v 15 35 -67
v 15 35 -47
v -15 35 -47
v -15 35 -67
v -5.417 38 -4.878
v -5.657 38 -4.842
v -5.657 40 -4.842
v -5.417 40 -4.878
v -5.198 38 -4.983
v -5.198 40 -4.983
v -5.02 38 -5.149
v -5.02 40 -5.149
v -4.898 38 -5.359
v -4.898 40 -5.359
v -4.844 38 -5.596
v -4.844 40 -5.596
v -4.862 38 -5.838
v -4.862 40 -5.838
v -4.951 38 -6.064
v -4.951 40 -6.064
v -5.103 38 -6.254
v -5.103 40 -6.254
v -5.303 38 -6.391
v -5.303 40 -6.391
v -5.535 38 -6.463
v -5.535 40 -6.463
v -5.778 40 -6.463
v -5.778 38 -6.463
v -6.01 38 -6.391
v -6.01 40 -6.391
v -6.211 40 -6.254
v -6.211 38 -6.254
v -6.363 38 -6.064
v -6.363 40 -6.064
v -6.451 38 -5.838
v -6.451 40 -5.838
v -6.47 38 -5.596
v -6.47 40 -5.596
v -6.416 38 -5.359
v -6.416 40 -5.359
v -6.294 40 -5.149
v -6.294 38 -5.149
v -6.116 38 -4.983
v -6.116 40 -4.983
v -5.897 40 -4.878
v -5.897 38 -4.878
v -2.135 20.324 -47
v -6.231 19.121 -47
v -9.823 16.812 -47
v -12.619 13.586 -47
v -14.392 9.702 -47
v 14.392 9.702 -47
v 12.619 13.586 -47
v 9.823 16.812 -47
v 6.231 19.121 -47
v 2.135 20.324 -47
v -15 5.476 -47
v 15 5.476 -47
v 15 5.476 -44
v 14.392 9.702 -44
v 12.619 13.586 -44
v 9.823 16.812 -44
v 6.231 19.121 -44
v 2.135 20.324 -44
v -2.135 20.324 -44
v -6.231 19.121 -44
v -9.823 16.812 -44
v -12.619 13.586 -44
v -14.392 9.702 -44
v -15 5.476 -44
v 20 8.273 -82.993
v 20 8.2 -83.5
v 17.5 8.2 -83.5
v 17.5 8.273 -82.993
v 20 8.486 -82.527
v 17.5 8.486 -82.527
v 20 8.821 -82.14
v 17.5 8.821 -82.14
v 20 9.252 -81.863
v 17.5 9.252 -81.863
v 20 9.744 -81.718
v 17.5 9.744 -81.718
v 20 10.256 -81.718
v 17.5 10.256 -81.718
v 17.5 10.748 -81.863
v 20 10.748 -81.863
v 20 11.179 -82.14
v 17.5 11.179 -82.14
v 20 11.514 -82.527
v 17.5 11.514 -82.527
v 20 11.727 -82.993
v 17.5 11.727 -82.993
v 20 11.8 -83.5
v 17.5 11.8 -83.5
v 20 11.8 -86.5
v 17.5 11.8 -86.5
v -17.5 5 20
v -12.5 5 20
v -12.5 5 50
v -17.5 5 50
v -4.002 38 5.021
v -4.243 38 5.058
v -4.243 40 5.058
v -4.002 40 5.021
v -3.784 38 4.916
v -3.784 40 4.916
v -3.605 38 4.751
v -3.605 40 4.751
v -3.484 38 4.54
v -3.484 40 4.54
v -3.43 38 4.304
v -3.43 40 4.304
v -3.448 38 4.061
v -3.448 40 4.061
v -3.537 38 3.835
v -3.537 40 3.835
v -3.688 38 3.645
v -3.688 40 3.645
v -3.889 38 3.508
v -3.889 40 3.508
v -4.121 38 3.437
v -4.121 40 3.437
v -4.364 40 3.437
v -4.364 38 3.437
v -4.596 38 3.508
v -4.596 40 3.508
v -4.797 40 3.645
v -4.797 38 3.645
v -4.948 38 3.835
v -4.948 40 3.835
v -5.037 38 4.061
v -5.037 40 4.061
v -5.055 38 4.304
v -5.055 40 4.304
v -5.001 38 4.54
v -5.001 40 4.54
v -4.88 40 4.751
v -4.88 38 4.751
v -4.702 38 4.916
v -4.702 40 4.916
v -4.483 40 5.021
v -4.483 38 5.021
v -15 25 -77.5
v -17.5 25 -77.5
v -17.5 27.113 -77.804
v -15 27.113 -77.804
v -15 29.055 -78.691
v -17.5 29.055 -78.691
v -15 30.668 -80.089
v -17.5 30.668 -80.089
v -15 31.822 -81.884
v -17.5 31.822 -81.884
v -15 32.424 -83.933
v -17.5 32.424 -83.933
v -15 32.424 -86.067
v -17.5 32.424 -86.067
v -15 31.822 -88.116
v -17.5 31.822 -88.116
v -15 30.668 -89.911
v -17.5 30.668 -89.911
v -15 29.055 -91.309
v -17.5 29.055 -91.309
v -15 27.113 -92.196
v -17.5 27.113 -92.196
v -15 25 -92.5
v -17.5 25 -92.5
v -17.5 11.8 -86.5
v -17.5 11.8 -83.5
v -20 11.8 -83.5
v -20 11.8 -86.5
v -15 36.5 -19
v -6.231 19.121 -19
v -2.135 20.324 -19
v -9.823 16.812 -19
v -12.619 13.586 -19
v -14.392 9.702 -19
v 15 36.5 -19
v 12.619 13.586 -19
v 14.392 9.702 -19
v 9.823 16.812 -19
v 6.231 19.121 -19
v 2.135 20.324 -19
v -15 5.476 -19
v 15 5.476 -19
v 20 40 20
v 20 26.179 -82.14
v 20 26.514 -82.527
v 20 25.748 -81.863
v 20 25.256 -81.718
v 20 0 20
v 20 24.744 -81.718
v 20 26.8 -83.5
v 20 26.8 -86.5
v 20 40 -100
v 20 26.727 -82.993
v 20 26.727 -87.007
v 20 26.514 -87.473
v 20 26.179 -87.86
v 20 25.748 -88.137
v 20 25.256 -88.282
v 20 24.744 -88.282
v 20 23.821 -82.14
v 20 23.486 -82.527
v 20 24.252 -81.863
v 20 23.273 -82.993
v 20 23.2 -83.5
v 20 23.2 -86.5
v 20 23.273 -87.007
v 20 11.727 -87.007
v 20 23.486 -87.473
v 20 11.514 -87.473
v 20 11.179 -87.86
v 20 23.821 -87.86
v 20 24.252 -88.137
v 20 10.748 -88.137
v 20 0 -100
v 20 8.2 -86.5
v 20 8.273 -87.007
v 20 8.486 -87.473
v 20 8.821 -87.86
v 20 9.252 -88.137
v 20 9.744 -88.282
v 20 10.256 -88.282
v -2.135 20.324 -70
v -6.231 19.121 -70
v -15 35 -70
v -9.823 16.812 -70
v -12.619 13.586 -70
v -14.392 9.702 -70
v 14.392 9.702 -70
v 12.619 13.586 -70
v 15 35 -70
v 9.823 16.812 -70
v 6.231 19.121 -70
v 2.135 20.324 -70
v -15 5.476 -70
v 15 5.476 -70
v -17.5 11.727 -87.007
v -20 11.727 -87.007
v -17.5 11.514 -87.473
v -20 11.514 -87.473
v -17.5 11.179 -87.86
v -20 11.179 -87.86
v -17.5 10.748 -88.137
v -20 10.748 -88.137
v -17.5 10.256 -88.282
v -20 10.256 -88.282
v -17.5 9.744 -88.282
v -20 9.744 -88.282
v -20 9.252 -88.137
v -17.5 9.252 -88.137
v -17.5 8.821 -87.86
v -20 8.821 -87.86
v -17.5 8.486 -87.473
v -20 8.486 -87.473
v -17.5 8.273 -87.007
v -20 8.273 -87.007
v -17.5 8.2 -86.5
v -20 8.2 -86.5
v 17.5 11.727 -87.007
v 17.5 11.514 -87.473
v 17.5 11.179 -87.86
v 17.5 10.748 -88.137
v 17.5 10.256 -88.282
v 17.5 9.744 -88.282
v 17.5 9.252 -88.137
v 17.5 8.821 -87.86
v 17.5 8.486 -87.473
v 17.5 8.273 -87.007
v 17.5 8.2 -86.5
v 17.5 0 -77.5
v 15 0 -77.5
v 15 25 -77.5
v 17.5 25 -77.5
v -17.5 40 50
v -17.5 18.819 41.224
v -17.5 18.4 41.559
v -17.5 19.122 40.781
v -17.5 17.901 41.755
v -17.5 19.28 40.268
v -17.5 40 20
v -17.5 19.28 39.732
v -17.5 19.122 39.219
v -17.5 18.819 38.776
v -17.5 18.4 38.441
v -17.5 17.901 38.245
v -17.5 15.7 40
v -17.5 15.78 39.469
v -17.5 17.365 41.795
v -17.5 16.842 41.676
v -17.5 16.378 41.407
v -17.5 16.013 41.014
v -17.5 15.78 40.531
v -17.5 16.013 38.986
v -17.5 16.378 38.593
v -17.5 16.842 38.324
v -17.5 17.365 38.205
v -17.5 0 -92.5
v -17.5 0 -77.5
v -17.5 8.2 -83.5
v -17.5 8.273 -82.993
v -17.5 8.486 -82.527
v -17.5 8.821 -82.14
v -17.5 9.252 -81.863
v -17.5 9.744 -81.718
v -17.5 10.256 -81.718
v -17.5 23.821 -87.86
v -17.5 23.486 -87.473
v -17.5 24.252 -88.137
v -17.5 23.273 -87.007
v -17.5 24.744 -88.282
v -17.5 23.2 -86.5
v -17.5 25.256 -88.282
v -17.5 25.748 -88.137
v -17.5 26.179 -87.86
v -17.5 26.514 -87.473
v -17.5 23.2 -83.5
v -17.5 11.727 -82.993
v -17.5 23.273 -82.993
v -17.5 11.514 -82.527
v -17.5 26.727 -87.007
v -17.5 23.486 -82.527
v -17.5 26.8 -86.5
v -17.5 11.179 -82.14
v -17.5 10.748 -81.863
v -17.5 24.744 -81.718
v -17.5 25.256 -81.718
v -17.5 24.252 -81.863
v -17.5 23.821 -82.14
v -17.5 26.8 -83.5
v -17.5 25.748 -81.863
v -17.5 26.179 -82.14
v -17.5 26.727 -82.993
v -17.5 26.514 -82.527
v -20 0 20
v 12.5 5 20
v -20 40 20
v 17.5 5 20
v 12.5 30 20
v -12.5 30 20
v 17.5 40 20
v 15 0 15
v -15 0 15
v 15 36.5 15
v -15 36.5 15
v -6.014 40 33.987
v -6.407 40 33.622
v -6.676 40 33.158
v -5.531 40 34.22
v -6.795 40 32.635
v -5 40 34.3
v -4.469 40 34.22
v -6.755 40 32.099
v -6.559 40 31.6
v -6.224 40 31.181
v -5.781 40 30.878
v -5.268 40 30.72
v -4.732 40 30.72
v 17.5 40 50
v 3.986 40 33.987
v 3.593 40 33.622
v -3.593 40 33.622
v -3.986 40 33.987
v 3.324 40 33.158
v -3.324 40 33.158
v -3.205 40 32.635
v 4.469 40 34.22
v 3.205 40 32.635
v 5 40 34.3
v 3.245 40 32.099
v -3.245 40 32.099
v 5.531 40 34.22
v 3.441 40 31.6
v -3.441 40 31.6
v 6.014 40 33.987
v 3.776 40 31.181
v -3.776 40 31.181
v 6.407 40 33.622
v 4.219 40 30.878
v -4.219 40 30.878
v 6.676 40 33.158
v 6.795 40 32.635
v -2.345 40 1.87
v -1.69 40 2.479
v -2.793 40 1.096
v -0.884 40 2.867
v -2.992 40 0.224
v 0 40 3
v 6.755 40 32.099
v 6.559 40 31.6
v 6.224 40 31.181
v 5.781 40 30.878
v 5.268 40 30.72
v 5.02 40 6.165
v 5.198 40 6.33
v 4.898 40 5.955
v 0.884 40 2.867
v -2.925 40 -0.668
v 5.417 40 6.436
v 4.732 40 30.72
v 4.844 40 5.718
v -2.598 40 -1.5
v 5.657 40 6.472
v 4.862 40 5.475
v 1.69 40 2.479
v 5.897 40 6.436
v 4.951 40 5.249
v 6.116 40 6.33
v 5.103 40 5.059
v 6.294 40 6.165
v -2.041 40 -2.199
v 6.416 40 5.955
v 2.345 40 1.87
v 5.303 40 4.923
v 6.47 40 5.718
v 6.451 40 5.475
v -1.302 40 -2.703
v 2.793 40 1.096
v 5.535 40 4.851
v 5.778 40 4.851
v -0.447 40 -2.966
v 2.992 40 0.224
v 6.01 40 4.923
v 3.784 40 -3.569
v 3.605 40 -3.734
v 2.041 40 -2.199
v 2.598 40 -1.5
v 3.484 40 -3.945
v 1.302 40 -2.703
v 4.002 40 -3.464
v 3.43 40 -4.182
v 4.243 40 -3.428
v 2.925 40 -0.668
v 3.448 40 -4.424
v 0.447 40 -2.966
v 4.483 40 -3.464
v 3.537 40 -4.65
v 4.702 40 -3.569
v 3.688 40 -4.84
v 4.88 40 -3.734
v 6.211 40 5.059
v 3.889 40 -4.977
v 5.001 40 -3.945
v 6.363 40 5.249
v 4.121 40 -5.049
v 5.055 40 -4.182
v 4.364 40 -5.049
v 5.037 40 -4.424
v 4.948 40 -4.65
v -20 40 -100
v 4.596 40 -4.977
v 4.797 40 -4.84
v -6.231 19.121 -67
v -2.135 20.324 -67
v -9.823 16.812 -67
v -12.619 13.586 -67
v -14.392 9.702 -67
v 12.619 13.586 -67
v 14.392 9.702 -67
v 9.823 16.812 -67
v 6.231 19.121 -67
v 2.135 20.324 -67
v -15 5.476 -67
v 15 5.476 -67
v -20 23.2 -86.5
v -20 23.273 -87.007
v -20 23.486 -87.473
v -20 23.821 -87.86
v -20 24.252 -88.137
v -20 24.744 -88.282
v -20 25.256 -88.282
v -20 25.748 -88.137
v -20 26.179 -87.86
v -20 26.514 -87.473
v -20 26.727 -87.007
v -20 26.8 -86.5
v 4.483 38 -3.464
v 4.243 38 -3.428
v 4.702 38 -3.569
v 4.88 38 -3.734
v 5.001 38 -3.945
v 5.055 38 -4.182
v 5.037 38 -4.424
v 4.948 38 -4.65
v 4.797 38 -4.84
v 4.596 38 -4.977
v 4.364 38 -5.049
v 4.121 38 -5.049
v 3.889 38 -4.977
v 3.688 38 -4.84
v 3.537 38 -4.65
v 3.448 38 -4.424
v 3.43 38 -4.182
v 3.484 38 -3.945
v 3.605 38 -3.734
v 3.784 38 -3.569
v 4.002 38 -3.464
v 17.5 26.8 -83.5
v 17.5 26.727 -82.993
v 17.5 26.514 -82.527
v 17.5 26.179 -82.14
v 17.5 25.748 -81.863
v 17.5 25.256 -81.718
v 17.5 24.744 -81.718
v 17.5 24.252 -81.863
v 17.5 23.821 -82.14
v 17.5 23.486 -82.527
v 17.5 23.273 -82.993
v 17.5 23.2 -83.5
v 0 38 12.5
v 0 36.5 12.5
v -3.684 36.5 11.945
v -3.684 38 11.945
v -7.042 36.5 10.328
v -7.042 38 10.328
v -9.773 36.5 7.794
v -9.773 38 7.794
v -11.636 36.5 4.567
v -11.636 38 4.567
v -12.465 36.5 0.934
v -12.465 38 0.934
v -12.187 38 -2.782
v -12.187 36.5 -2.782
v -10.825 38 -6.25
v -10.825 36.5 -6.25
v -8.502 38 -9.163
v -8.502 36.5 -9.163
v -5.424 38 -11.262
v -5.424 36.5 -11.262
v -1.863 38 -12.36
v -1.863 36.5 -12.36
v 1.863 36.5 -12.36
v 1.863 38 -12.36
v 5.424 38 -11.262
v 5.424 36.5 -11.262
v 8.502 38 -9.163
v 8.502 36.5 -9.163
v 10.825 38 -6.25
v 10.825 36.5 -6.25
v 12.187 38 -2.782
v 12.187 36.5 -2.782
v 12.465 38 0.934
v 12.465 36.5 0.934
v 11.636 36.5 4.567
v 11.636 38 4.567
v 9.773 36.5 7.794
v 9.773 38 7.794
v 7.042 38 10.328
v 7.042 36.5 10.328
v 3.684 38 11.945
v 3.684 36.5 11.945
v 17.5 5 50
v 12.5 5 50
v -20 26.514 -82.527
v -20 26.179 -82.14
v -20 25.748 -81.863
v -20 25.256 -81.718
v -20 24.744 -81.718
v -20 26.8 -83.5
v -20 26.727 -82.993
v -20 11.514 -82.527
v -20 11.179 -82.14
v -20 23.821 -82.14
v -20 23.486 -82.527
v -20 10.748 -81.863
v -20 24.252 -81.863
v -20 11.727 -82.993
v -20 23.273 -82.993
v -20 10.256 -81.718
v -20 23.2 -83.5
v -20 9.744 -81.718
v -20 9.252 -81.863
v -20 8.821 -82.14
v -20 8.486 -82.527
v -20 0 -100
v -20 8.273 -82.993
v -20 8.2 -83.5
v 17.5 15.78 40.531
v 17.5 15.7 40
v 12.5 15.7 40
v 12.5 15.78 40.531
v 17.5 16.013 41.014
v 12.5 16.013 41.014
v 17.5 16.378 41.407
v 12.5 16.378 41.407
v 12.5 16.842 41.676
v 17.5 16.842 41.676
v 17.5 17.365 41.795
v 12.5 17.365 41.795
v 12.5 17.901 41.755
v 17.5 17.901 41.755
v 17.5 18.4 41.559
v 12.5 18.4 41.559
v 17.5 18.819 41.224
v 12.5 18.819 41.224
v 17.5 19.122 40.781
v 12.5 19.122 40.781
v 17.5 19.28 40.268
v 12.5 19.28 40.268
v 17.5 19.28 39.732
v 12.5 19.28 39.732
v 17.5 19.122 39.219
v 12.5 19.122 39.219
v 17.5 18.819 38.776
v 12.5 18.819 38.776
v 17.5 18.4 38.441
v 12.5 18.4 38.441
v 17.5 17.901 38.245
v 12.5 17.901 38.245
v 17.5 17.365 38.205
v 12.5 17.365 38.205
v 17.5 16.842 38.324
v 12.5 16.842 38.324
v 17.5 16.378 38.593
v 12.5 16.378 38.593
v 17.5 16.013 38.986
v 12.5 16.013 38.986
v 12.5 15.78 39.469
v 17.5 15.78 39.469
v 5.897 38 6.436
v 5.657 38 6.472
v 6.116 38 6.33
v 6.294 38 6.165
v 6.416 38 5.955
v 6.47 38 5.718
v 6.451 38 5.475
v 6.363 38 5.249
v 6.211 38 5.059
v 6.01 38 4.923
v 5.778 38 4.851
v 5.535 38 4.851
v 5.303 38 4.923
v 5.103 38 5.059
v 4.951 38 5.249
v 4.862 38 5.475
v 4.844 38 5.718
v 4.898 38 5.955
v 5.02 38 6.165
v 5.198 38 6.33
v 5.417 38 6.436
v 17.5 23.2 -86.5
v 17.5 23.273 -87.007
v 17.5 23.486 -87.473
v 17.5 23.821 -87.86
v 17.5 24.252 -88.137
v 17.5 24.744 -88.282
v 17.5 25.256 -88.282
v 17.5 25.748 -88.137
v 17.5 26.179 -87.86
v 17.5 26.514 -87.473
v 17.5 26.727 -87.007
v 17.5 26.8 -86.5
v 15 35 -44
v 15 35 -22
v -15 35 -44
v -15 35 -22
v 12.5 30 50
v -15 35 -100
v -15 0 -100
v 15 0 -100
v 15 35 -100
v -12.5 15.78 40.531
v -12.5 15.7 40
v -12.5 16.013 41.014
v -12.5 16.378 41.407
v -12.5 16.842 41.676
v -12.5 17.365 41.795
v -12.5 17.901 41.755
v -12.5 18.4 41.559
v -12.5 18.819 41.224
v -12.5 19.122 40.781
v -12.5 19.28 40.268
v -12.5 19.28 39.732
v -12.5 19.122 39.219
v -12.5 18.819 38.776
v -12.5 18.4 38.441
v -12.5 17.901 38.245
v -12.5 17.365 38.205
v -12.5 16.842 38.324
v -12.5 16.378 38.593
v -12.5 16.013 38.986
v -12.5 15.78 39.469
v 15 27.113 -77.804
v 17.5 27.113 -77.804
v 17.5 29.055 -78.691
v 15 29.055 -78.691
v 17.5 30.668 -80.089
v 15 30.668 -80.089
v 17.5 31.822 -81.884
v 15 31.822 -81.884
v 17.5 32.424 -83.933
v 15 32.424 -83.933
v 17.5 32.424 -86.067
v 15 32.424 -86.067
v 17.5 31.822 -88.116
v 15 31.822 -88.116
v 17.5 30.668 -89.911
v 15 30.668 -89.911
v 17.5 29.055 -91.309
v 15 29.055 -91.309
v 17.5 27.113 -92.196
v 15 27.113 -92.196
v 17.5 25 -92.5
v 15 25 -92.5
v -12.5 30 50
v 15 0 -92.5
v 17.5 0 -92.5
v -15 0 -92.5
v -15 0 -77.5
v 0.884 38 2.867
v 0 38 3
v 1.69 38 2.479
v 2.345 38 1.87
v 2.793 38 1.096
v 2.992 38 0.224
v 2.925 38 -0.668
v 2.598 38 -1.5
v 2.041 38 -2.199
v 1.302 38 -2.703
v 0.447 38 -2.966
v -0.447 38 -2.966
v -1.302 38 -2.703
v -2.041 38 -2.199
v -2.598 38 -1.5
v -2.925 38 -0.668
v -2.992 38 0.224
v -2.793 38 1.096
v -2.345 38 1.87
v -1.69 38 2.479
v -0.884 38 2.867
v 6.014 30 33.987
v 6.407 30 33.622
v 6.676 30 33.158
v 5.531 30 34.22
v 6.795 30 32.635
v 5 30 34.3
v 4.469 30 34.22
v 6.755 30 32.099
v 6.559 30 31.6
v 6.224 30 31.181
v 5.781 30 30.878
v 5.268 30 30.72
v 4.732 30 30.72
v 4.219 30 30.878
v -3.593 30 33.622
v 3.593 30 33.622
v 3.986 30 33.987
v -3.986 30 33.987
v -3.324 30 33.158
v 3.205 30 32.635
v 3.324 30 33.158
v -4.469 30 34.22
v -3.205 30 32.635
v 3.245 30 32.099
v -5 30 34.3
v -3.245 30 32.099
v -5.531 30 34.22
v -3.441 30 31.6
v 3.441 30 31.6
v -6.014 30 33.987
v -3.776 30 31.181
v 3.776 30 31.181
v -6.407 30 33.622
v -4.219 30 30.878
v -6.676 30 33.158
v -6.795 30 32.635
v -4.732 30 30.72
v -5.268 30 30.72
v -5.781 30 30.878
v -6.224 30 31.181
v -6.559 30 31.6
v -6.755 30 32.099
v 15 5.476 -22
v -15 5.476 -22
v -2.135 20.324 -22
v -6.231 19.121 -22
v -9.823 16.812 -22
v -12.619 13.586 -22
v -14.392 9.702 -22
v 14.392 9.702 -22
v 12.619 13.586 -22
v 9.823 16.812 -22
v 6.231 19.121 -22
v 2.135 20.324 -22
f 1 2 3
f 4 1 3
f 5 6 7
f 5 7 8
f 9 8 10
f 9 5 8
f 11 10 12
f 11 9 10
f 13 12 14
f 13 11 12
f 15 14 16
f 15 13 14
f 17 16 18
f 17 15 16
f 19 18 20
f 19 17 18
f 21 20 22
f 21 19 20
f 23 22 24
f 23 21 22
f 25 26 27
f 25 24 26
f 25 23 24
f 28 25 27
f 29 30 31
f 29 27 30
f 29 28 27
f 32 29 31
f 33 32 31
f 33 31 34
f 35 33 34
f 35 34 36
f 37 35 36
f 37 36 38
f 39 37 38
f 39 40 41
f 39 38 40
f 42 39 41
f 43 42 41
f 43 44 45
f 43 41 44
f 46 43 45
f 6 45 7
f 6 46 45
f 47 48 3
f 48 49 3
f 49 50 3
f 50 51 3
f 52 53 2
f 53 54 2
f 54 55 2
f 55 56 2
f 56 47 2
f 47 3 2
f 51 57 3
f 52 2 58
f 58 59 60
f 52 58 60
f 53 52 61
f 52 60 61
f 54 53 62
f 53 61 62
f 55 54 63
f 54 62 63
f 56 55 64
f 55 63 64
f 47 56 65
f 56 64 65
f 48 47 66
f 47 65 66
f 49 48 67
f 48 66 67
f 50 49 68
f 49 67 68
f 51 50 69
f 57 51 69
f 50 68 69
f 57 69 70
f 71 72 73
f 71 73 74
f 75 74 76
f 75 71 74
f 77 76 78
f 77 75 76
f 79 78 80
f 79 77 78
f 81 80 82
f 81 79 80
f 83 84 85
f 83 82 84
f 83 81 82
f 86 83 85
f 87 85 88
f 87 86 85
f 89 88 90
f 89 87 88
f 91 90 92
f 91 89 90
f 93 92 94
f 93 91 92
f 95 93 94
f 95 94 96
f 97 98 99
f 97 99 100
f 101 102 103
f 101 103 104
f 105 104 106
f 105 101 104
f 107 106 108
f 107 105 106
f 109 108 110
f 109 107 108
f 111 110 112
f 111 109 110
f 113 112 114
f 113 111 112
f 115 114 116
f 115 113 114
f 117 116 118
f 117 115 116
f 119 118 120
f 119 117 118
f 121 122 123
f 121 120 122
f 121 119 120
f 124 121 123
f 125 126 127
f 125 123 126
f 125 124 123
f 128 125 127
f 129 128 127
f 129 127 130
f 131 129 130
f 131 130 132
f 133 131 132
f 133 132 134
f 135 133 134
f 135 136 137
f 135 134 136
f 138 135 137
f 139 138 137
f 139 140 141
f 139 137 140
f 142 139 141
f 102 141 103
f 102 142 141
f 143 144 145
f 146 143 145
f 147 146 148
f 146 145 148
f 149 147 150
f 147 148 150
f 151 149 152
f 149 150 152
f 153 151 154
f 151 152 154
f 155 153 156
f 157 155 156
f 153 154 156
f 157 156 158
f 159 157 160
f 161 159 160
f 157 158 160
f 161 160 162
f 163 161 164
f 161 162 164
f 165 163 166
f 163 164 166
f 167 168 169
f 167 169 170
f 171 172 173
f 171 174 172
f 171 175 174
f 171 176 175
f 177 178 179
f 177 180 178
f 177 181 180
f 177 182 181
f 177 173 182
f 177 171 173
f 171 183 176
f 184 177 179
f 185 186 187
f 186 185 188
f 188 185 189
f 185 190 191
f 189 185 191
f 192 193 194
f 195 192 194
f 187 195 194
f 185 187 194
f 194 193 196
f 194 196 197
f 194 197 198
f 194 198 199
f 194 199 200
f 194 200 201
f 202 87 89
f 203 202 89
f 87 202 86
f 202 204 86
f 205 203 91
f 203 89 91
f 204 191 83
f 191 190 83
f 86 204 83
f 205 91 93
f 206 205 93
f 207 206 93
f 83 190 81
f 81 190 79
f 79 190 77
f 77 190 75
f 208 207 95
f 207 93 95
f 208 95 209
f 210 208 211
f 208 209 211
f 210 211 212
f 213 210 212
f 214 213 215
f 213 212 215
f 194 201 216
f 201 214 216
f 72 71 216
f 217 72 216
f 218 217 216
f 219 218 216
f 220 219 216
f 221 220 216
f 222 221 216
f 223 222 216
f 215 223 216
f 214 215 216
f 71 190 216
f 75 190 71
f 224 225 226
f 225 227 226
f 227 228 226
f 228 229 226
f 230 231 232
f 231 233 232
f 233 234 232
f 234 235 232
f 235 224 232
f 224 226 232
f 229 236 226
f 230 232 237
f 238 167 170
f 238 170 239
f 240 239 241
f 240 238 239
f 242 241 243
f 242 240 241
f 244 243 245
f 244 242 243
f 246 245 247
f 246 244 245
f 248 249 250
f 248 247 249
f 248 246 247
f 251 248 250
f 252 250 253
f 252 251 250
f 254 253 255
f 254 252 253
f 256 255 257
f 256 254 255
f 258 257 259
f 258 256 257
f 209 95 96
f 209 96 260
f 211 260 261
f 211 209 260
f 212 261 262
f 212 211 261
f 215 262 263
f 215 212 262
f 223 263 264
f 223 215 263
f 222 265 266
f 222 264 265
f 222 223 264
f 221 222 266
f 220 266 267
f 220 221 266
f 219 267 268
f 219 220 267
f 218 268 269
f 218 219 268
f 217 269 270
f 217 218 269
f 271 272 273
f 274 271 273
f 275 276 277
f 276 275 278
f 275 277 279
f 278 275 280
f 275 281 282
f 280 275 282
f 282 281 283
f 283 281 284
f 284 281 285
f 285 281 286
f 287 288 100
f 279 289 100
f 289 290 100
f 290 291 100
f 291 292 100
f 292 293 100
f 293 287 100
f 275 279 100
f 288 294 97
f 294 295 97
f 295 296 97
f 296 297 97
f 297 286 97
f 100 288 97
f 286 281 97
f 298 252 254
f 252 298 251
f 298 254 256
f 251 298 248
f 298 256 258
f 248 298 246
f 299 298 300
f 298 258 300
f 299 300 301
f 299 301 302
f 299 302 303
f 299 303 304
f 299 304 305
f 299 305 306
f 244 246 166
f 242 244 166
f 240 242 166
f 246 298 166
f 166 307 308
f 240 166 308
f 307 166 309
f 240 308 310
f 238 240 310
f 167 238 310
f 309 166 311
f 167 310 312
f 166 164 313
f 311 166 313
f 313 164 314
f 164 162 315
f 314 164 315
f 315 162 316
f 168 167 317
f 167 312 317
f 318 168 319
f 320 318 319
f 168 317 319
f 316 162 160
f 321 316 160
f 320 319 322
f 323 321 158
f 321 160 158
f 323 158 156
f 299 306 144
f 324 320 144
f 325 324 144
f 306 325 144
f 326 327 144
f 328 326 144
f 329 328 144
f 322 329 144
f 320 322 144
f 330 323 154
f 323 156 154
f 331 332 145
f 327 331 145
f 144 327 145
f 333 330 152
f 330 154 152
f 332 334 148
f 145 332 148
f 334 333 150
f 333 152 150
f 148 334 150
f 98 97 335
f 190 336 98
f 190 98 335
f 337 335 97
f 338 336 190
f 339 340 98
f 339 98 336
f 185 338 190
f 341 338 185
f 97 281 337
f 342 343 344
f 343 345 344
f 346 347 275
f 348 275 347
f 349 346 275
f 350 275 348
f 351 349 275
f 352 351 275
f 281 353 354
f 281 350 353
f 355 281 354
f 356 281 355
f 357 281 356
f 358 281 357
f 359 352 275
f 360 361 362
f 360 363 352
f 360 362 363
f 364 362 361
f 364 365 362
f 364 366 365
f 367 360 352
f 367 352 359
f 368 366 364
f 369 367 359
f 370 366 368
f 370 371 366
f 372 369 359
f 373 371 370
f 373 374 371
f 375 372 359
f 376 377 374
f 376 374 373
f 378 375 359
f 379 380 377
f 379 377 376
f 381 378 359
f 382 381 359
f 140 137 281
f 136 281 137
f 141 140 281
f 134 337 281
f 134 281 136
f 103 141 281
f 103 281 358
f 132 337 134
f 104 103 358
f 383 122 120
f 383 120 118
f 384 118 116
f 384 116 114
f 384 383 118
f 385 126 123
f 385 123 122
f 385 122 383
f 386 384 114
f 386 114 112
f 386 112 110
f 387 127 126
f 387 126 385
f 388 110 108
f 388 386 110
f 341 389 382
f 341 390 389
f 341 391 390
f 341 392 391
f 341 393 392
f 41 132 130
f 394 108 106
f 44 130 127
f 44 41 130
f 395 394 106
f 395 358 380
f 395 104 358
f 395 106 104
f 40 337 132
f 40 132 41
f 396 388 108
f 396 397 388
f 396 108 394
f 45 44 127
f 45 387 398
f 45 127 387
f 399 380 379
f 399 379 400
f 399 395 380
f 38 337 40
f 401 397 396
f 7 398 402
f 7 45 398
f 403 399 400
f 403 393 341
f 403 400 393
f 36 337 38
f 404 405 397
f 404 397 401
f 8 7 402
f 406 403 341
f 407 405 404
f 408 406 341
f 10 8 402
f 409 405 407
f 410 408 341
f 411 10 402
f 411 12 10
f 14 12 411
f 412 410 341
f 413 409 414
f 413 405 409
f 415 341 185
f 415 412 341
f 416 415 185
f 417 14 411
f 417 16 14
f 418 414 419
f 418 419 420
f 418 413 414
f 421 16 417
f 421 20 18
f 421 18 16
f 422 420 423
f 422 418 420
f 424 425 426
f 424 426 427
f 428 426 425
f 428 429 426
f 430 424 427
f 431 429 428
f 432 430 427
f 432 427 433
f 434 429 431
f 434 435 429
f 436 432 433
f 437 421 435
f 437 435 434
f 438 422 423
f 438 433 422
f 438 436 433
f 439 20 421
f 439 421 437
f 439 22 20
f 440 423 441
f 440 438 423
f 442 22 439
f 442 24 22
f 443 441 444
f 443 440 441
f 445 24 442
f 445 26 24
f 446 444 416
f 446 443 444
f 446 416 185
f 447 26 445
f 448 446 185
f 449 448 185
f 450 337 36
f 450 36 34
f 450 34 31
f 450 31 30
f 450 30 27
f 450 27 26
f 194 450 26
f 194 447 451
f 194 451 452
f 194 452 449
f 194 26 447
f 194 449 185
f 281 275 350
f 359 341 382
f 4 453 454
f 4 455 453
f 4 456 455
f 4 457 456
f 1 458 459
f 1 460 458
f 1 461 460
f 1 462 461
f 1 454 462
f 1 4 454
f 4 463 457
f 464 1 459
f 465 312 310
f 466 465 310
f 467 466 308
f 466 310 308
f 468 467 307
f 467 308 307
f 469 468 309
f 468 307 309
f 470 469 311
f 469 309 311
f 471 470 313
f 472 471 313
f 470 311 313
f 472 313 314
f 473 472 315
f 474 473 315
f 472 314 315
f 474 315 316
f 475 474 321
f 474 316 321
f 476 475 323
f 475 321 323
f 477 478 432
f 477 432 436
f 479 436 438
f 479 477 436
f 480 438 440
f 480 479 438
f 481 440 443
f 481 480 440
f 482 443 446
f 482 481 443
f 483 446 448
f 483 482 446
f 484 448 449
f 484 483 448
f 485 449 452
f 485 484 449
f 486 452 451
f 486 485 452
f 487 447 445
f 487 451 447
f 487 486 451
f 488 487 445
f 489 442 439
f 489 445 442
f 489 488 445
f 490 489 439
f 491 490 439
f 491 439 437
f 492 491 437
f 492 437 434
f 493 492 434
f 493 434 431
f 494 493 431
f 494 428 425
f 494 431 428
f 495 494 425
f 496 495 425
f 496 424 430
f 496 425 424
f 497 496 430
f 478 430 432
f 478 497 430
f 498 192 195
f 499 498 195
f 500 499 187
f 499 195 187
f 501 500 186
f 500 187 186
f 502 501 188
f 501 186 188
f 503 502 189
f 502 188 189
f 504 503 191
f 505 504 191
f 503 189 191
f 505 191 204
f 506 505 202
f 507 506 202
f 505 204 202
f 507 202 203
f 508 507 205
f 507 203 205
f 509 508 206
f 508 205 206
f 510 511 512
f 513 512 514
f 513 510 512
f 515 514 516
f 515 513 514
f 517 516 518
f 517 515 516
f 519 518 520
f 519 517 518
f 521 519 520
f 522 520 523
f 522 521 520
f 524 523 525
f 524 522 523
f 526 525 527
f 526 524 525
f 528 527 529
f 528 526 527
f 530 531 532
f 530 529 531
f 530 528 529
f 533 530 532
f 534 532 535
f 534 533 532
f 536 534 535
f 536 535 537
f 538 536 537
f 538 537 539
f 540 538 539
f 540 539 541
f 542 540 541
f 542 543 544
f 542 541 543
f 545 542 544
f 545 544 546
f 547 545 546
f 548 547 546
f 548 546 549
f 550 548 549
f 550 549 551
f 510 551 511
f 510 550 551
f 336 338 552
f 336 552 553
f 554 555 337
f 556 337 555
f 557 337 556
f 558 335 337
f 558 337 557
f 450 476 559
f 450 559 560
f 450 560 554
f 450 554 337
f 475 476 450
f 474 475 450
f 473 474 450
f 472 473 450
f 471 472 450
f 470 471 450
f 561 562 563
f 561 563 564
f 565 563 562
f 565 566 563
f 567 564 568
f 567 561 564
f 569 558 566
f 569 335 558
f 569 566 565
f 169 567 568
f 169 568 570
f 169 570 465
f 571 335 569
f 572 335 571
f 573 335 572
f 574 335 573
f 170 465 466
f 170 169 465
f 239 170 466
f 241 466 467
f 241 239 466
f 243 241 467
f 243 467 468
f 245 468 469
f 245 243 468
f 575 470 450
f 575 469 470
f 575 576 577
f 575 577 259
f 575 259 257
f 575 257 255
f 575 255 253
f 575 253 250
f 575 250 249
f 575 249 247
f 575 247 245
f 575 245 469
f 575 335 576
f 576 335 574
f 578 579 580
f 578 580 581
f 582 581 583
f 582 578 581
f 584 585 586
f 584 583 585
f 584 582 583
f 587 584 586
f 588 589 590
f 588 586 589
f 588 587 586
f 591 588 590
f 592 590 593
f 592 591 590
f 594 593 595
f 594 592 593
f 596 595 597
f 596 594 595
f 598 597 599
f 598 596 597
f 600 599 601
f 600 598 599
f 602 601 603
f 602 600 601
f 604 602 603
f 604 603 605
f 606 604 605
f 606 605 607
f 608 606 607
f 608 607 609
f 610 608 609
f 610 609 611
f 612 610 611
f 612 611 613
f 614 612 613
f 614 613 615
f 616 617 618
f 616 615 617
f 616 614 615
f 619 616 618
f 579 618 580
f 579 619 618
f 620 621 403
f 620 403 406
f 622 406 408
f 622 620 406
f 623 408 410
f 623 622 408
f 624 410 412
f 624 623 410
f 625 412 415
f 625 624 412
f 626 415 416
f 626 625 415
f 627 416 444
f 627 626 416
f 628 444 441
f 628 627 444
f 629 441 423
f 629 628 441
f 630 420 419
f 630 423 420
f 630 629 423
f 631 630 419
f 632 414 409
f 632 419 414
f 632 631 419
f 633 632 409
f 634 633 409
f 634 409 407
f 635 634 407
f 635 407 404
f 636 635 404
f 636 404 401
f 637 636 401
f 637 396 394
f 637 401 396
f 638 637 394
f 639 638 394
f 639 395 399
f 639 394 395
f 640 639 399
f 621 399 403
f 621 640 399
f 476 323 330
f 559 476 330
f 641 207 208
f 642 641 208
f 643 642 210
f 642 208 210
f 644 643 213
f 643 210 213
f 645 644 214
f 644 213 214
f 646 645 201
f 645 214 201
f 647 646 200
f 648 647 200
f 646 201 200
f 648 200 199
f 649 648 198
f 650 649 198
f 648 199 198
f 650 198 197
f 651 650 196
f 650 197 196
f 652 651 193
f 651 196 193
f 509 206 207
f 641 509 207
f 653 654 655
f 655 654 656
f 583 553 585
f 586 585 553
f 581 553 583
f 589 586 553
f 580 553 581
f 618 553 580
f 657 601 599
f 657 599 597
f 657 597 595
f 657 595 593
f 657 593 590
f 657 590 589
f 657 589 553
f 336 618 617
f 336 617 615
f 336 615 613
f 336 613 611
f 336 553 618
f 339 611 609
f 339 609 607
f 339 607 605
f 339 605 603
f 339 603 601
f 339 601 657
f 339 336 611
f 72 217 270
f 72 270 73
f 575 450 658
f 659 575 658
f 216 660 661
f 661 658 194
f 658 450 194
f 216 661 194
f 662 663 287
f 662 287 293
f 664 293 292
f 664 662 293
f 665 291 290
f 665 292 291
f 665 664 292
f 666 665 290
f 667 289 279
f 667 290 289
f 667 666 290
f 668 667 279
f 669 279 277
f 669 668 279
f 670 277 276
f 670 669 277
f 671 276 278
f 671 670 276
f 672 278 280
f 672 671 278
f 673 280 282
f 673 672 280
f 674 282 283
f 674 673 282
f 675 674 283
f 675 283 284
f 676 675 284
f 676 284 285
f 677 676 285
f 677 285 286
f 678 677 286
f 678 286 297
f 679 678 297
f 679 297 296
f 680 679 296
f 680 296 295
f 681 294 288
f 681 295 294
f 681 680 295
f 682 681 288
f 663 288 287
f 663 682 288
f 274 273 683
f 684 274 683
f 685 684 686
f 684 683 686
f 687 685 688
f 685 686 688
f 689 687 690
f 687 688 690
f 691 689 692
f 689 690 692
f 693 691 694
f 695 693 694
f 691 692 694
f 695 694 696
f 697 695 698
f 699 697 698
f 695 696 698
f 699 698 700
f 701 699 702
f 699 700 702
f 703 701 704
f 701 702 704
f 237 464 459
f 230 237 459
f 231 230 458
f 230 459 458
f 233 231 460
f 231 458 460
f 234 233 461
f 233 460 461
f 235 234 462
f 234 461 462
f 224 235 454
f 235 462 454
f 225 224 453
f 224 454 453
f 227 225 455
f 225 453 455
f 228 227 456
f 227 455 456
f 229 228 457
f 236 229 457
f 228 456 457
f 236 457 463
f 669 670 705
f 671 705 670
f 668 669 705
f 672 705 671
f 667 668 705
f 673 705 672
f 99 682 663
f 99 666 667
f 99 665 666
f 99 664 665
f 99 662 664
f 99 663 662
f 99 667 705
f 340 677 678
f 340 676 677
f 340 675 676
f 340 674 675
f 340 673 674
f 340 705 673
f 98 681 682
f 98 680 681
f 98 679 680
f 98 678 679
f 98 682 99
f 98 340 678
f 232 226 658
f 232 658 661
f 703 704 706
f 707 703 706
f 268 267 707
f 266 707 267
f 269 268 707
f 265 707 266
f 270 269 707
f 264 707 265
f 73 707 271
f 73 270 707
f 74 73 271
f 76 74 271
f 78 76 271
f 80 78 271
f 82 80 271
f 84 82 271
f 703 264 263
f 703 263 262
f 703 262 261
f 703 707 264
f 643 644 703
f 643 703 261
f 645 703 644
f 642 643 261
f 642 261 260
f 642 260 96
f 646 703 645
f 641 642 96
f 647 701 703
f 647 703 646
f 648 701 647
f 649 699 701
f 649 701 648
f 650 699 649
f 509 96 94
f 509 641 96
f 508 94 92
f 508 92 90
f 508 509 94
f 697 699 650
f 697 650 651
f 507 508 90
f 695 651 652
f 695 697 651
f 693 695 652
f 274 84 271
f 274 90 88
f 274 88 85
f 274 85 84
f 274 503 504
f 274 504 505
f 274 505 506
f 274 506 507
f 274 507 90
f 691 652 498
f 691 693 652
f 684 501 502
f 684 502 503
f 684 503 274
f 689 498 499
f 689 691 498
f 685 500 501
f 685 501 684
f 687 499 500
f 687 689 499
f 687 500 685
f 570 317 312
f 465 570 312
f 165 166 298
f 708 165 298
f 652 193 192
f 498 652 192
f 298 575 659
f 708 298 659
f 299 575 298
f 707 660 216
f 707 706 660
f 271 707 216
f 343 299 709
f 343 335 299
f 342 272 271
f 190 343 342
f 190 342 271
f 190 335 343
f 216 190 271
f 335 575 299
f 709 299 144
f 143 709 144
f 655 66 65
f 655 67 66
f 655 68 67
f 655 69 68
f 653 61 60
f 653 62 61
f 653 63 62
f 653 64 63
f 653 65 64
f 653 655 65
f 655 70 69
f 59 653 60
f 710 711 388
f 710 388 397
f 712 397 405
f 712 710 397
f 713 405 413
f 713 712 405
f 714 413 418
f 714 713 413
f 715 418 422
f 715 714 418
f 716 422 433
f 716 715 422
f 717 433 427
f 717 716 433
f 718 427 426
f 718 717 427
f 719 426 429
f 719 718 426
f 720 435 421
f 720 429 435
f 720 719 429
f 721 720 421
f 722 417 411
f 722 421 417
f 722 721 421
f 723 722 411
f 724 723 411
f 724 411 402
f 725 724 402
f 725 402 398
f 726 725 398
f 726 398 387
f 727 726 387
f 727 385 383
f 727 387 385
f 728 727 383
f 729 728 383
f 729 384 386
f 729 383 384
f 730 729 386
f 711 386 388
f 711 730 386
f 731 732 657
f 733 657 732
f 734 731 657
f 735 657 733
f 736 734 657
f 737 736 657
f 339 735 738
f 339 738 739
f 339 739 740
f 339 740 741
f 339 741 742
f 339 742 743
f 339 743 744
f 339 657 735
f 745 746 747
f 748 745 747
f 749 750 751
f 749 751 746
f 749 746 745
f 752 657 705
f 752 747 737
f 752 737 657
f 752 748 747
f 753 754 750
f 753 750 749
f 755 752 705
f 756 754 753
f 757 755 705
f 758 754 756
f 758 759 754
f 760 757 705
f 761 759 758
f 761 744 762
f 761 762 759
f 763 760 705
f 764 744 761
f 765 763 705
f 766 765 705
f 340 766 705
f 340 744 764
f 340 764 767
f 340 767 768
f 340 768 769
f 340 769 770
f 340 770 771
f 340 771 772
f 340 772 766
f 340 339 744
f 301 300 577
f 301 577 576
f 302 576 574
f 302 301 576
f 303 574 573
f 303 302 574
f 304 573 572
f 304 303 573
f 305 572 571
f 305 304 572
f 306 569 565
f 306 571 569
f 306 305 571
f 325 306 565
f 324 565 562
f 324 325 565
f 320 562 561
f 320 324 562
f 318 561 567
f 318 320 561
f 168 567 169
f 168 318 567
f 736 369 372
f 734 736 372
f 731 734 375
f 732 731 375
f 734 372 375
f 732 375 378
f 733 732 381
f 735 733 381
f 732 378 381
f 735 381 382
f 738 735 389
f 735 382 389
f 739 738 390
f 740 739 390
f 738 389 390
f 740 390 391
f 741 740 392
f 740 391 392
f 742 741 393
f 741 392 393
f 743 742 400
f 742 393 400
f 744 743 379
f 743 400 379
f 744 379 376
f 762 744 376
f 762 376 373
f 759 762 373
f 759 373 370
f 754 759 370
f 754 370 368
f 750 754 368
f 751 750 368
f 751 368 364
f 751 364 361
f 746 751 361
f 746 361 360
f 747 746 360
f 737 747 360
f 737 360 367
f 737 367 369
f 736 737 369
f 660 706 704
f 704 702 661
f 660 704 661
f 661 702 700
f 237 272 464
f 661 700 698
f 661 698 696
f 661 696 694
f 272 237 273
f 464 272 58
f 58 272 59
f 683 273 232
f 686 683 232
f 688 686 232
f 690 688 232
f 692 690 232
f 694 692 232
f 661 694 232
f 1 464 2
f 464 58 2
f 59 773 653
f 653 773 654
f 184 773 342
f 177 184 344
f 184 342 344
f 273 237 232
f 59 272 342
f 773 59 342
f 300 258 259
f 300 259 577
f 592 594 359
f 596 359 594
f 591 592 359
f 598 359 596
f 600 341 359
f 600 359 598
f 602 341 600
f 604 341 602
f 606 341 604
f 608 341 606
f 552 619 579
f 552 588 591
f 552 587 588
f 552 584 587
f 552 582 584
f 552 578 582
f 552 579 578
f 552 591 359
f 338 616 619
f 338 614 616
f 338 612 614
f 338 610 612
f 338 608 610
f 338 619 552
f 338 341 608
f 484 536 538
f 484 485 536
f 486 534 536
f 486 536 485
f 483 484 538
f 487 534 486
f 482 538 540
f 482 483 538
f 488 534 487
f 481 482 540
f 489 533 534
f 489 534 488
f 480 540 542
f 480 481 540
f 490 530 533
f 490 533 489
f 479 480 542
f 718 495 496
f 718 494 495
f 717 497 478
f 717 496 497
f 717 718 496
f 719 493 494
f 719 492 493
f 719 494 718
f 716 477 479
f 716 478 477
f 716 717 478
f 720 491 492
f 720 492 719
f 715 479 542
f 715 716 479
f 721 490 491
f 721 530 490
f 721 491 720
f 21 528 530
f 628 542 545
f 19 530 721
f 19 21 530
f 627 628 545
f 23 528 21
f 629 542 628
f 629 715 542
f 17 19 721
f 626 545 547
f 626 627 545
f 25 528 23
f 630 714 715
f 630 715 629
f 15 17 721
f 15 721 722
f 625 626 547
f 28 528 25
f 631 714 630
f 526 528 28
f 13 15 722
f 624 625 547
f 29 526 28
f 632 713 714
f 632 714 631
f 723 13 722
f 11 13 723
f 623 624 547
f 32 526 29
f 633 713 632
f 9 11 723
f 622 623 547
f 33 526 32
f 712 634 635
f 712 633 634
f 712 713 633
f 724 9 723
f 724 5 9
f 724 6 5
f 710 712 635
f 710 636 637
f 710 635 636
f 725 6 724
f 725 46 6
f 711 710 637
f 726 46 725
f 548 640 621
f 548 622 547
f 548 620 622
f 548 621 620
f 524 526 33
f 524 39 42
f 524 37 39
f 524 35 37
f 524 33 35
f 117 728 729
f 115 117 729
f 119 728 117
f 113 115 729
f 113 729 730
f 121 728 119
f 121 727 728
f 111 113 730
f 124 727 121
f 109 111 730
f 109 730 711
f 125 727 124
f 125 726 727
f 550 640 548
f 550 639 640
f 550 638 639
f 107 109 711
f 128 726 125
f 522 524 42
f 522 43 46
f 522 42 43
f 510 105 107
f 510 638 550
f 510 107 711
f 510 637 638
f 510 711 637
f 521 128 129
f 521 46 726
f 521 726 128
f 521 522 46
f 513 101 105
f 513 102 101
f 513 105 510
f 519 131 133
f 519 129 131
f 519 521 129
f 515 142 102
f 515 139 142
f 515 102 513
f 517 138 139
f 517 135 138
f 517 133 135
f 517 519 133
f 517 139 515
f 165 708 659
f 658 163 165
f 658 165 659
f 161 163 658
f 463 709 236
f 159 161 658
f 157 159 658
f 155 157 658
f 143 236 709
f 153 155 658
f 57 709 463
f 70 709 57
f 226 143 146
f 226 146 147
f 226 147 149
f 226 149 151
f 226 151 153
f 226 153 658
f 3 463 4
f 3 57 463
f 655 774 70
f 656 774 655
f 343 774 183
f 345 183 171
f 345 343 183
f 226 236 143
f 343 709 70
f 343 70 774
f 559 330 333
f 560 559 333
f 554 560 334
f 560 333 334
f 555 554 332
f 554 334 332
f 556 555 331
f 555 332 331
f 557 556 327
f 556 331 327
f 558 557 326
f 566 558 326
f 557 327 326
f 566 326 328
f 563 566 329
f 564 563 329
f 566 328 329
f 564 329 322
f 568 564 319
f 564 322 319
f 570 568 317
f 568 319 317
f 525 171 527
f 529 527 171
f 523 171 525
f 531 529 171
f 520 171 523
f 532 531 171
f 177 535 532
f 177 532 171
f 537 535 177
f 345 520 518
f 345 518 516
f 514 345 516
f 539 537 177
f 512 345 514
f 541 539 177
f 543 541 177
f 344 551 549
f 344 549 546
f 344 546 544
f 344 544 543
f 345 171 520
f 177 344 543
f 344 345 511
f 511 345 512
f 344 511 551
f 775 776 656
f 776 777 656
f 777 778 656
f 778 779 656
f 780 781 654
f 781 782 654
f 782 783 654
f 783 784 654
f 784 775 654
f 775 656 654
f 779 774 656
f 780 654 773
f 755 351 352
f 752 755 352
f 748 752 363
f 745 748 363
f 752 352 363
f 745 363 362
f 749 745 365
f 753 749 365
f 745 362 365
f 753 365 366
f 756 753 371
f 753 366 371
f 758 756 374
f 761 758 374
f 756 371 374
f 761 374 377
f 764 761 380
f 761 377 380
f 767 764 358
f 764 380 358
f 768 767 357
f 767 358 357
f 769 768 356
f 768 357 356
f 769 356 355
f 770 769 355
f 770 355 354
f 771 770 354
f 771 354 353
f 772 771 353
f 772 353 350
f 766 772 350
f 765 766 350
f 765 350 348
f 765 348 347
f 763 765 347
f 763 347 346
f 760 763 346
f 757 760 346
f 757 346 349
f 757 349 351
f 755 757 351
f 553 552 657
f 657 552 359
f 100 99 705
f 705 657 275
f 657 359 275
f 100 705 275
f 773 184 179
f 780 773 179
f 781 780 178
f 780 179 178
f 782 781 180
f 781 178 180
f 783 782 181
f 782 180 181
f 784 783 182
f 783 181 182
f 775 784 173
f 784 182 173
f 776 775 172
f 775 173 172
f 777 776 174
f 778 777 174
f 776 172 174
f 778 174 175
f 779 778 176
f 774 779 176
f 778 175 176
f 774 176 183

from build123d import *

# Parameters (mm, degrees)
SKETCH1_W                = 40
SKETCH1_H                = 40
SKETCH1_R                = 2.375
BOSS_EXTRUDE1_DEPTH      = 40
CUT_EXTRUDE1_DEPTH       = 61
CUT_EXTRUDE1_DEPTH_BACK  = 61
CUT_EXTRUDE2_DEPTH       = 49.989795019
CUT_EXTRUDE2_DEPTH_BACK  = 35
SKETCH6_W                = 30
SKETCH6_H                = 35
SKETCH3_R                = 3
CUT_EXTRUDE3_DEPTH       = 61
BOSS_EXTRUDE2_DEPTH      = 30
SKETCH8_R                = 1.8
CUT_EXTRUDE4_DEPTH       = 68.082039325
BOSS_EXTRUDE4_START      = -35
SKETCH10_W               = 5
SKETCH10_H               = 35
BOSS_EXTRUDE4_DEPTH      = 115
SKETCH11_R               = 2.375
CUT_EXTRUDE5_DEPTH       = 70
CUT_EXTRUDE6_DEPTH       = 115.891252931
CUT_EXTRUDE6_DEPTH_BACK  = 115.891252931
SKETCH14_W               = 30
SKETCH14_H               = 3
BOSS_EXTRUDE10_DEPTH     = 35
CUT_EXTRUDE7_DEPTH       = 108.819293264
CUT_EXTRUDE7_DEPTH_BACK  = 1.5
SKETCH16_W               = 30
SKETCH16_H               = 34
CUT_EXTRUDE8_DEPTH       = 32
CUT_EXTRUDE8_DEPTH_BACK  = 32.5
CUT_EXTRUDE9_DEPTH       = 115.04494728
CUT_EXTRUDE9_DEPTH_BACK  = 115.04494728
SKETCH19_R               = 1.8
SKETCH3_2_R              = 3
BOSS_EXTRUDE11_DEPTH     = 5
SKETCH20_W               = 30
SKETCH20_H               = 35
CUT_EXTRUDE10_DEPTH      = 10
CUT_EXTRUDE11_DEPTH      = 110.544511501
CUT_EXTRUDE11_DEPTH_BACK = 110.544511501
SKETCH22_R               = 3
SKETCH21_R               = 2.375
BOSS_EXTRUDE13_DEPTH     = 3.5
CUT_EXTRUDE12_DEPTH      = 110.544511501
CUT_EXTRUDE12_DEPTH_BACK = 110.544511501
SKETCH23_R               = 0.815
CUT_EXTRUDE13_DEPTH      = 109.315511355
CUT_EXTRUDE13_DEPTH_BACK = 1.5
SKETCH24_R               = 12.5
CUT_EXTRUDE14_DEPTH      = 17.5
CUT_EXTRUDE14_DEPTH_BACK = 17.5


with BuildPart() as part:
    # Sketch1 → Boss-Extrude1 (new body)
    with BuildSketch(Plane(origin=(0, 0, 0), x_dir=(1, 0, 0), z_dir=(0, 1, 0))):
        Rectangle(SKETCH1_W, SKETCH1_H)
        with Locations(Location((6.88, 0, 0), (0, 0, 270))):
            Circle(SKETCH1_R, mode=Mode.SUBTRACT)
        with Locations(Location((-0.009652089, -6.889652089, 0), (0, 0, 270))):
            Circle(SKETCH1_R, mode=Mode.SUBTRACT)
        with Locations(Location((-6.899304178, 0, 0), (0, 0, 270))):
            Circle(SKETCH1_R, mode=Mode.SUBTRACT)
        with Locations(Location((-0.009652089, 6.889652089, 0), (0, 0, 270))):
            Circle(SKETCH1_R, mode=Mode.SUBTRACT)
    extrude(amount=BOSS_EXTRUDE1_DEPTH)

    # Sketch4 → Cut-Extrude1 (cut, two sides: drawn at the far end of the back side and taken through both)
    with BuildSketch(Plane.ZY.offset(20).offset(-CUT_EXTRUDE1_DEPTH_BACK)):
        with BuildLine():
            Line((-20, 35), (-20, 0))
            Line((-20, 0), (15, 0))
            ThreePointArc((15, 0), (4.748737342, 24.748737342), (-20, 35))
        make_face()
    extrude(amount=CUT_EXTRUDE1_DEPTH + CUT_EXTRUDE1_DEPTH_BACK, mode=Mode.SUBTRACT)

    # Sketch6 → Cut-Extrude2 (cut, two sides: drawn at the far end of the back side and taken through both)
    with BuildSketch(Plane.XZ.offset(-CUT_EXTRUDE2_DEPTH_BACK)):
        with Locations((0, -2.5)):
            Rectangle(SKETCH6_W, SKETCH6_H)
    extrude(amount=CUT_EXTRUDE2_DEPTH + CUT_EXTRUDE2_DEPTH_BACK, mode=Mode.SUBTRACT)

    # Sketch3 → Cut-Extrude3 (cut, through all)
    with BuildSketch(Plane.XY.offset(20)):
        with Locations((0, 13)):
            Circle(SKETCH3_R)
        with Locations((-7, 20)):
            Circle(SKETCH3_R)
        with Locations((7, 20)):
            Circle(SKETCH3_R)
    extrude(amount=-CUT_EXTRUDE3_DEPTH, mode=Mode.SUBTRACT)

    # Sketch7 → Boss-Extrude2 (add)
    with BuildSketch(Plane.XY.offset(20)):
        Polygon((-17.5, 40), (17.5, 40), (17.5, 5), (12.5, 5), (12.5, 30), (-12.5, 30), (-12.5, 5), (-17.5, 5), (-17.5, 23.79079138), align=None)
    extrude(amount=BOSS_EXTRUDE2_DEPTH)

    # Sketch8 → Cut-Extrude4 (cut, through all)
    with BuildSketch(Plane(origin=(0, 40, 0), x_dir=(1, 0, 0), z_dir=(0, 1, 0))):
        with Locations(Location((5, -32.5, 0), (0, 0, 270))):
            Circle(SKETCH8_R)
        with Locations(Location((-5, -32.5, 0), (0, 0, 270))):
            Circle(SKETCH8_R)
    extrude(amount=-CUT_EXTRUDE4_DEPTH, mode=Mode.SUBTRACT)

    # Sketch10 → Boss-Extrude4 (add)
    with BuildSketch(Plane(origin=(0, 0, -20), x_dir=(-1, 0, 0), z_dir=(0, 0, -1)).offset(BOSS_EXTRUDE4_START)):
        Polygon((20, 40), (-20, 40), (-20, 35), (-15, 35), (15, 35), (20, 35), align=None)
        with Locations((17.5, 17.5)):
            Rectangle(SKETCH10_W, SKETCH10_H)
        with Locations((-17.5, 17.5)):
            Rectangle(SKETCH10_W, SKETCH10_H)
    extrude(amount=BOSS_EXTRUDE4_DEPTH)

    # Sketch11 → Cut-Extrude5 (cut)
    with BuildSketch(Plane(origin=(0, 40, 0), x_dir=(1, 0, 0), z_dir=(0, 1, 0))):
        with Locations(Location((-0.009652089, -6.889652089, 0), (0, 0, 270))):
            Circle(SKETCH11_R)
        with Locations(Location((6.88, 0, 0), (0, 0, 270))):
            Circle(SKETCH11_R)
        with Locations(Location((-0.009652089, 6.889652089, 0), (0, 0, 270))):
            Circle(SKETCH11_R)
        with Locations(Location((-6.899304178, 0, 0), (0, 0, 270))):
            Circle(SKETCH11_R)
    extrude(amount=-CUT_EXTRUDE5_DEPTH, mode=Mode.SUBTRACT)

    # Sketch13 → Cut-Extrude6 (cut, two sides: drawn at the far end of the back side and taken through both)
    with BuildSketch(Plane.ZY.offset(20).offset(-CUT_EXTRUDE6_DEPTH_BACK)):
        with BuildLine():
            Line((-86.5, 26.8), (-83.5, 26.8))
            ThreePointArc((-83.5, 26.8), (-81.7, 25), (-83.5, 23.2))
            Line((-83.5, 23.2), (-86.5, 23.2))
            ThreePointArc((-86.5, 23.2), (-88.3, 25), (-86.5, 26.8))
        make_face()
        with BuildLine():
            Line((-86.5, 8.2), (-83.5, 8.2))
            ThreePointArc((-83.5, 8.2), (-81.7, 10), (-83.5, 11.8))
            Line((-83.5, 11.8), (-86.5, 11.8))
            ThreePointArc((-86.5, 11.8), (-88.3, 10), (-86.5, 8.2))
        make_face()
    extrude(amount=CUT_EXTRUDE6_DEPTH + CUT_EXTRUDE6_DEPTH_BACK, mode=Mode.SUBTRACT)

    # Sketch14 → Boss-Extrude10 (add)
    with BuildSketch(Plane.XZ.offset(-35)):
        with Locations((0, -98.5)):
            Rectangle(SKETCH14_W, SKETCH14_H)
        with Locations((0, -45.5)):
            Rectangle(SKETCH14_W, SKETCH14_H)
        with Locations((0, -20.5)):
            Rectangle(SKETCH14_W, SKETCH14_H)
        with Locations((0, -68.5)):
            Rectangle(SKETCH14_W, SKETCH14_H)
    extrude(amount=BOSS_EXTRUDE10_DEPTH)

    # Sketch16 → Cut-Extrude7 (cut, two sides: drawn at the far end of the back side and taken through both)
    with BuildSketch(Plane.XZ.offset(-35).offset(-CUT_EXTRUDE7_DEPTH_BACK)):
        with Locations((0, -2)):
            Rectangle(SKETCH16_W, SKETCH16_H)
    extrude(amount=CUT_EXTRUDE7_DEPTH + CUT_EXTRUDE7_DEPTH_BACK, mode=Mode.SUBTRACT)

    # Sketch17 → Cut-Extrude8 (cut, two sides: drawn at the far end of the back side and taken through both)
    with BuildSketch(Plane(origin=(0, 0, -47), x_dir=(-1, 0, 0), z_dir=(0, 0, -1)).offset(-CUT_EXTRUDE8_DEPTH_BACK)):
        with BuildLine():
            Line((-15, -8.523755025), (-15, 5.476244975))
            ThreePointArc((-15, 5.476244975), (0, 20.476244975), (15, 5.476244975))
            Line((15, 5.476244975), (15, -8.523755025))
            ThreePointArc((15, -8.523755025), (0, -23.523755025), (-15, -8.523755025))
        make_face()
    extrude(amount=CUT_EXTRUDE8_DEPTH + CUT_EXTRUDE8_DEPTH_BACK, mode=Mode.SUBTRACT)

    # Sketch19 → Cut-Extrude9 (cut, two sides: drawn at the far end of the back side and taken through both)
    with BuildSketch(Plane.ZY.offset(17.5).offset(-CUT_EXTRUDE9_DEPTH_BACK)):
        with Locations(Location((40, 17.5, 0), (0, 0, 270))):
            Circle(SKETCH19_R)
    extrude(amount=CUT_EXTRUDE9_DEPTH + CUT_EXTRUDE9_DEPTH_BACK, mode=Mode.SUBTRACT)

    # Sketch3<2> → Boss-Extrude11 (add)
    with BuildSketch(Plane.XY.offset(20)):
        with Locations((0, 13)):
            Circle(SKETCH3_2_R)
        with Locations((-7, 20)):
            Circle(SKETCH3_2_R)
        with Locations((7, 20)):
            Circle(SKETCH3_2_R)
    extrude(amount=-BOSS_EXTRUDE11_DEPTH)

    # Sketch20 → Cut-Extrude10 (cut)
    with BuildSketch(Plane.XY.offset(-97)):
        with Locations((0, 17.5)):
            Rectangle(SKETCH20_W, SKETCH20_H)
    extrude(amount=-CUT_EXTRUDE10_DEPTH, mode=Mode.SUBTRACT)

    # Sketch22 → Cut-Extrude11 (cut, two sides: drawn at the far end of the back side and taken through both)
    with BuildSketch(Plane(origin=(0, 40, 0), x_dir=(1, 0, 0), z_dir=(0, 1, 0)).offset(-CUT_EXTRUDE11_DEPTH_BACK)):
        with Locations(Location((0, 0, 0), (0, 0, 270))):
            Circle(SKETCH22_R)
    extrude(amount=CUT_EXTRUDE11_DEPTH + CUT_EXTRUDE11_DEPTH_BACK, mode=Mode.SUBTRACT)

    # Sketch21 → Boss-Extrude13 (add)
    with BuildSketch(Plane(origin=(0, 40, 0), x_dir=(1, 0, 0), z_dir=(0, 1, 0))):
        with Locations((-0.009652089, -6.889652089)):
            Circle(SKETCH21_R)
        with Locations((6.88, 0)):
            Circle(SKETCH21_R)
        with Locations((-0.009652089, 6.889652089)):
            Circle(SKETCH21_R)
        with Locations((-6.899304178, 0)):
            Circle(SKETCH21_R)
    extrude(amount=-BOSS_EXTRUDE13_DEPTH)

    # Sketch23 → Cut-Extrude12 (cut, two sides: drawn at the far end of the back side and taken through both)
    with BuildSketch(Plane(origin=(0, 40, 0), x_dir=(1, 0, 0), z_dir=(0, 1, 0)).offset(-CUT_EXTRUDE12_DEPTH_BACK)):
        with Locations(Location((-5.656854249, 5.656854249, 0), (0, 0, 270))):
            Circle(SKETCH23_R)
        with Locations(Location((4.242640687, 4.242640687, 0), (0, 0, 270))):
            Circle(SKETCH23_R)
        with Locations(Location((5.656854249, -5.656854249, 0), (0, 0, 270))):
            Circle(SKETCH23_R)
        with Locations(Location((-4.242640687, -4.242640687, 0), (0, 0, 270))):
            Circle(SKETCH23_R)
    extrude(amount=CUT_EXTRUDE12_DEPTH + CUT_EXTRUDE12_DEPTH_BACK, mode=Mode.SUBTRACT)

    # Sketch24 → Cut-Extrude13 (cut, two sides: drawn at the far end of the back side and taken through both)
    with BuildSketch(Plane.XZ.offset(-36.5).offset(-CUT_EXTRUDE13_DEPTH_BACK)):
        with Locations(Location((0, 0, 0), (0, 0, 90))):
            Circle(SKETCH24_R)
    extrude(amount=CUT_EXTRUDE13_DEPTH + CUT_EXTRUDE13_DEPTH_BACK, mode=Mode.SUBTRACT)

    # Sketch25 → Cut-Extrude14 (cut, two sides: drawn at the far end of the back side and taken through both)
    with BuildSketch(Plane(origin=(0, 0, 0), x_dir=(0, 0, -1), z_dir=(1, 0, 0)).offset(-CUT_EXTRUDE14_DEPTH_BACK)):
        with BuildLine():
            Line((92.5, 25), (92.5, -7.922367103))
            ThreePointArc((92.5, -7.922367103), (85, -15.422367103), (77.5, -7.922367103))
            Line((77.5, -7.922367103), (77.5, 25))
            ThreePointArc((77.5, 25), (85, 32.5), (92.5, 25))
        make_face()
    extrude(amount=CUT_EXTRUDE14_DEPTH + CUT_EXTRUDE14_DEPTH_BACK, mode=Mode.SUBTRACT)


solid = part.part
